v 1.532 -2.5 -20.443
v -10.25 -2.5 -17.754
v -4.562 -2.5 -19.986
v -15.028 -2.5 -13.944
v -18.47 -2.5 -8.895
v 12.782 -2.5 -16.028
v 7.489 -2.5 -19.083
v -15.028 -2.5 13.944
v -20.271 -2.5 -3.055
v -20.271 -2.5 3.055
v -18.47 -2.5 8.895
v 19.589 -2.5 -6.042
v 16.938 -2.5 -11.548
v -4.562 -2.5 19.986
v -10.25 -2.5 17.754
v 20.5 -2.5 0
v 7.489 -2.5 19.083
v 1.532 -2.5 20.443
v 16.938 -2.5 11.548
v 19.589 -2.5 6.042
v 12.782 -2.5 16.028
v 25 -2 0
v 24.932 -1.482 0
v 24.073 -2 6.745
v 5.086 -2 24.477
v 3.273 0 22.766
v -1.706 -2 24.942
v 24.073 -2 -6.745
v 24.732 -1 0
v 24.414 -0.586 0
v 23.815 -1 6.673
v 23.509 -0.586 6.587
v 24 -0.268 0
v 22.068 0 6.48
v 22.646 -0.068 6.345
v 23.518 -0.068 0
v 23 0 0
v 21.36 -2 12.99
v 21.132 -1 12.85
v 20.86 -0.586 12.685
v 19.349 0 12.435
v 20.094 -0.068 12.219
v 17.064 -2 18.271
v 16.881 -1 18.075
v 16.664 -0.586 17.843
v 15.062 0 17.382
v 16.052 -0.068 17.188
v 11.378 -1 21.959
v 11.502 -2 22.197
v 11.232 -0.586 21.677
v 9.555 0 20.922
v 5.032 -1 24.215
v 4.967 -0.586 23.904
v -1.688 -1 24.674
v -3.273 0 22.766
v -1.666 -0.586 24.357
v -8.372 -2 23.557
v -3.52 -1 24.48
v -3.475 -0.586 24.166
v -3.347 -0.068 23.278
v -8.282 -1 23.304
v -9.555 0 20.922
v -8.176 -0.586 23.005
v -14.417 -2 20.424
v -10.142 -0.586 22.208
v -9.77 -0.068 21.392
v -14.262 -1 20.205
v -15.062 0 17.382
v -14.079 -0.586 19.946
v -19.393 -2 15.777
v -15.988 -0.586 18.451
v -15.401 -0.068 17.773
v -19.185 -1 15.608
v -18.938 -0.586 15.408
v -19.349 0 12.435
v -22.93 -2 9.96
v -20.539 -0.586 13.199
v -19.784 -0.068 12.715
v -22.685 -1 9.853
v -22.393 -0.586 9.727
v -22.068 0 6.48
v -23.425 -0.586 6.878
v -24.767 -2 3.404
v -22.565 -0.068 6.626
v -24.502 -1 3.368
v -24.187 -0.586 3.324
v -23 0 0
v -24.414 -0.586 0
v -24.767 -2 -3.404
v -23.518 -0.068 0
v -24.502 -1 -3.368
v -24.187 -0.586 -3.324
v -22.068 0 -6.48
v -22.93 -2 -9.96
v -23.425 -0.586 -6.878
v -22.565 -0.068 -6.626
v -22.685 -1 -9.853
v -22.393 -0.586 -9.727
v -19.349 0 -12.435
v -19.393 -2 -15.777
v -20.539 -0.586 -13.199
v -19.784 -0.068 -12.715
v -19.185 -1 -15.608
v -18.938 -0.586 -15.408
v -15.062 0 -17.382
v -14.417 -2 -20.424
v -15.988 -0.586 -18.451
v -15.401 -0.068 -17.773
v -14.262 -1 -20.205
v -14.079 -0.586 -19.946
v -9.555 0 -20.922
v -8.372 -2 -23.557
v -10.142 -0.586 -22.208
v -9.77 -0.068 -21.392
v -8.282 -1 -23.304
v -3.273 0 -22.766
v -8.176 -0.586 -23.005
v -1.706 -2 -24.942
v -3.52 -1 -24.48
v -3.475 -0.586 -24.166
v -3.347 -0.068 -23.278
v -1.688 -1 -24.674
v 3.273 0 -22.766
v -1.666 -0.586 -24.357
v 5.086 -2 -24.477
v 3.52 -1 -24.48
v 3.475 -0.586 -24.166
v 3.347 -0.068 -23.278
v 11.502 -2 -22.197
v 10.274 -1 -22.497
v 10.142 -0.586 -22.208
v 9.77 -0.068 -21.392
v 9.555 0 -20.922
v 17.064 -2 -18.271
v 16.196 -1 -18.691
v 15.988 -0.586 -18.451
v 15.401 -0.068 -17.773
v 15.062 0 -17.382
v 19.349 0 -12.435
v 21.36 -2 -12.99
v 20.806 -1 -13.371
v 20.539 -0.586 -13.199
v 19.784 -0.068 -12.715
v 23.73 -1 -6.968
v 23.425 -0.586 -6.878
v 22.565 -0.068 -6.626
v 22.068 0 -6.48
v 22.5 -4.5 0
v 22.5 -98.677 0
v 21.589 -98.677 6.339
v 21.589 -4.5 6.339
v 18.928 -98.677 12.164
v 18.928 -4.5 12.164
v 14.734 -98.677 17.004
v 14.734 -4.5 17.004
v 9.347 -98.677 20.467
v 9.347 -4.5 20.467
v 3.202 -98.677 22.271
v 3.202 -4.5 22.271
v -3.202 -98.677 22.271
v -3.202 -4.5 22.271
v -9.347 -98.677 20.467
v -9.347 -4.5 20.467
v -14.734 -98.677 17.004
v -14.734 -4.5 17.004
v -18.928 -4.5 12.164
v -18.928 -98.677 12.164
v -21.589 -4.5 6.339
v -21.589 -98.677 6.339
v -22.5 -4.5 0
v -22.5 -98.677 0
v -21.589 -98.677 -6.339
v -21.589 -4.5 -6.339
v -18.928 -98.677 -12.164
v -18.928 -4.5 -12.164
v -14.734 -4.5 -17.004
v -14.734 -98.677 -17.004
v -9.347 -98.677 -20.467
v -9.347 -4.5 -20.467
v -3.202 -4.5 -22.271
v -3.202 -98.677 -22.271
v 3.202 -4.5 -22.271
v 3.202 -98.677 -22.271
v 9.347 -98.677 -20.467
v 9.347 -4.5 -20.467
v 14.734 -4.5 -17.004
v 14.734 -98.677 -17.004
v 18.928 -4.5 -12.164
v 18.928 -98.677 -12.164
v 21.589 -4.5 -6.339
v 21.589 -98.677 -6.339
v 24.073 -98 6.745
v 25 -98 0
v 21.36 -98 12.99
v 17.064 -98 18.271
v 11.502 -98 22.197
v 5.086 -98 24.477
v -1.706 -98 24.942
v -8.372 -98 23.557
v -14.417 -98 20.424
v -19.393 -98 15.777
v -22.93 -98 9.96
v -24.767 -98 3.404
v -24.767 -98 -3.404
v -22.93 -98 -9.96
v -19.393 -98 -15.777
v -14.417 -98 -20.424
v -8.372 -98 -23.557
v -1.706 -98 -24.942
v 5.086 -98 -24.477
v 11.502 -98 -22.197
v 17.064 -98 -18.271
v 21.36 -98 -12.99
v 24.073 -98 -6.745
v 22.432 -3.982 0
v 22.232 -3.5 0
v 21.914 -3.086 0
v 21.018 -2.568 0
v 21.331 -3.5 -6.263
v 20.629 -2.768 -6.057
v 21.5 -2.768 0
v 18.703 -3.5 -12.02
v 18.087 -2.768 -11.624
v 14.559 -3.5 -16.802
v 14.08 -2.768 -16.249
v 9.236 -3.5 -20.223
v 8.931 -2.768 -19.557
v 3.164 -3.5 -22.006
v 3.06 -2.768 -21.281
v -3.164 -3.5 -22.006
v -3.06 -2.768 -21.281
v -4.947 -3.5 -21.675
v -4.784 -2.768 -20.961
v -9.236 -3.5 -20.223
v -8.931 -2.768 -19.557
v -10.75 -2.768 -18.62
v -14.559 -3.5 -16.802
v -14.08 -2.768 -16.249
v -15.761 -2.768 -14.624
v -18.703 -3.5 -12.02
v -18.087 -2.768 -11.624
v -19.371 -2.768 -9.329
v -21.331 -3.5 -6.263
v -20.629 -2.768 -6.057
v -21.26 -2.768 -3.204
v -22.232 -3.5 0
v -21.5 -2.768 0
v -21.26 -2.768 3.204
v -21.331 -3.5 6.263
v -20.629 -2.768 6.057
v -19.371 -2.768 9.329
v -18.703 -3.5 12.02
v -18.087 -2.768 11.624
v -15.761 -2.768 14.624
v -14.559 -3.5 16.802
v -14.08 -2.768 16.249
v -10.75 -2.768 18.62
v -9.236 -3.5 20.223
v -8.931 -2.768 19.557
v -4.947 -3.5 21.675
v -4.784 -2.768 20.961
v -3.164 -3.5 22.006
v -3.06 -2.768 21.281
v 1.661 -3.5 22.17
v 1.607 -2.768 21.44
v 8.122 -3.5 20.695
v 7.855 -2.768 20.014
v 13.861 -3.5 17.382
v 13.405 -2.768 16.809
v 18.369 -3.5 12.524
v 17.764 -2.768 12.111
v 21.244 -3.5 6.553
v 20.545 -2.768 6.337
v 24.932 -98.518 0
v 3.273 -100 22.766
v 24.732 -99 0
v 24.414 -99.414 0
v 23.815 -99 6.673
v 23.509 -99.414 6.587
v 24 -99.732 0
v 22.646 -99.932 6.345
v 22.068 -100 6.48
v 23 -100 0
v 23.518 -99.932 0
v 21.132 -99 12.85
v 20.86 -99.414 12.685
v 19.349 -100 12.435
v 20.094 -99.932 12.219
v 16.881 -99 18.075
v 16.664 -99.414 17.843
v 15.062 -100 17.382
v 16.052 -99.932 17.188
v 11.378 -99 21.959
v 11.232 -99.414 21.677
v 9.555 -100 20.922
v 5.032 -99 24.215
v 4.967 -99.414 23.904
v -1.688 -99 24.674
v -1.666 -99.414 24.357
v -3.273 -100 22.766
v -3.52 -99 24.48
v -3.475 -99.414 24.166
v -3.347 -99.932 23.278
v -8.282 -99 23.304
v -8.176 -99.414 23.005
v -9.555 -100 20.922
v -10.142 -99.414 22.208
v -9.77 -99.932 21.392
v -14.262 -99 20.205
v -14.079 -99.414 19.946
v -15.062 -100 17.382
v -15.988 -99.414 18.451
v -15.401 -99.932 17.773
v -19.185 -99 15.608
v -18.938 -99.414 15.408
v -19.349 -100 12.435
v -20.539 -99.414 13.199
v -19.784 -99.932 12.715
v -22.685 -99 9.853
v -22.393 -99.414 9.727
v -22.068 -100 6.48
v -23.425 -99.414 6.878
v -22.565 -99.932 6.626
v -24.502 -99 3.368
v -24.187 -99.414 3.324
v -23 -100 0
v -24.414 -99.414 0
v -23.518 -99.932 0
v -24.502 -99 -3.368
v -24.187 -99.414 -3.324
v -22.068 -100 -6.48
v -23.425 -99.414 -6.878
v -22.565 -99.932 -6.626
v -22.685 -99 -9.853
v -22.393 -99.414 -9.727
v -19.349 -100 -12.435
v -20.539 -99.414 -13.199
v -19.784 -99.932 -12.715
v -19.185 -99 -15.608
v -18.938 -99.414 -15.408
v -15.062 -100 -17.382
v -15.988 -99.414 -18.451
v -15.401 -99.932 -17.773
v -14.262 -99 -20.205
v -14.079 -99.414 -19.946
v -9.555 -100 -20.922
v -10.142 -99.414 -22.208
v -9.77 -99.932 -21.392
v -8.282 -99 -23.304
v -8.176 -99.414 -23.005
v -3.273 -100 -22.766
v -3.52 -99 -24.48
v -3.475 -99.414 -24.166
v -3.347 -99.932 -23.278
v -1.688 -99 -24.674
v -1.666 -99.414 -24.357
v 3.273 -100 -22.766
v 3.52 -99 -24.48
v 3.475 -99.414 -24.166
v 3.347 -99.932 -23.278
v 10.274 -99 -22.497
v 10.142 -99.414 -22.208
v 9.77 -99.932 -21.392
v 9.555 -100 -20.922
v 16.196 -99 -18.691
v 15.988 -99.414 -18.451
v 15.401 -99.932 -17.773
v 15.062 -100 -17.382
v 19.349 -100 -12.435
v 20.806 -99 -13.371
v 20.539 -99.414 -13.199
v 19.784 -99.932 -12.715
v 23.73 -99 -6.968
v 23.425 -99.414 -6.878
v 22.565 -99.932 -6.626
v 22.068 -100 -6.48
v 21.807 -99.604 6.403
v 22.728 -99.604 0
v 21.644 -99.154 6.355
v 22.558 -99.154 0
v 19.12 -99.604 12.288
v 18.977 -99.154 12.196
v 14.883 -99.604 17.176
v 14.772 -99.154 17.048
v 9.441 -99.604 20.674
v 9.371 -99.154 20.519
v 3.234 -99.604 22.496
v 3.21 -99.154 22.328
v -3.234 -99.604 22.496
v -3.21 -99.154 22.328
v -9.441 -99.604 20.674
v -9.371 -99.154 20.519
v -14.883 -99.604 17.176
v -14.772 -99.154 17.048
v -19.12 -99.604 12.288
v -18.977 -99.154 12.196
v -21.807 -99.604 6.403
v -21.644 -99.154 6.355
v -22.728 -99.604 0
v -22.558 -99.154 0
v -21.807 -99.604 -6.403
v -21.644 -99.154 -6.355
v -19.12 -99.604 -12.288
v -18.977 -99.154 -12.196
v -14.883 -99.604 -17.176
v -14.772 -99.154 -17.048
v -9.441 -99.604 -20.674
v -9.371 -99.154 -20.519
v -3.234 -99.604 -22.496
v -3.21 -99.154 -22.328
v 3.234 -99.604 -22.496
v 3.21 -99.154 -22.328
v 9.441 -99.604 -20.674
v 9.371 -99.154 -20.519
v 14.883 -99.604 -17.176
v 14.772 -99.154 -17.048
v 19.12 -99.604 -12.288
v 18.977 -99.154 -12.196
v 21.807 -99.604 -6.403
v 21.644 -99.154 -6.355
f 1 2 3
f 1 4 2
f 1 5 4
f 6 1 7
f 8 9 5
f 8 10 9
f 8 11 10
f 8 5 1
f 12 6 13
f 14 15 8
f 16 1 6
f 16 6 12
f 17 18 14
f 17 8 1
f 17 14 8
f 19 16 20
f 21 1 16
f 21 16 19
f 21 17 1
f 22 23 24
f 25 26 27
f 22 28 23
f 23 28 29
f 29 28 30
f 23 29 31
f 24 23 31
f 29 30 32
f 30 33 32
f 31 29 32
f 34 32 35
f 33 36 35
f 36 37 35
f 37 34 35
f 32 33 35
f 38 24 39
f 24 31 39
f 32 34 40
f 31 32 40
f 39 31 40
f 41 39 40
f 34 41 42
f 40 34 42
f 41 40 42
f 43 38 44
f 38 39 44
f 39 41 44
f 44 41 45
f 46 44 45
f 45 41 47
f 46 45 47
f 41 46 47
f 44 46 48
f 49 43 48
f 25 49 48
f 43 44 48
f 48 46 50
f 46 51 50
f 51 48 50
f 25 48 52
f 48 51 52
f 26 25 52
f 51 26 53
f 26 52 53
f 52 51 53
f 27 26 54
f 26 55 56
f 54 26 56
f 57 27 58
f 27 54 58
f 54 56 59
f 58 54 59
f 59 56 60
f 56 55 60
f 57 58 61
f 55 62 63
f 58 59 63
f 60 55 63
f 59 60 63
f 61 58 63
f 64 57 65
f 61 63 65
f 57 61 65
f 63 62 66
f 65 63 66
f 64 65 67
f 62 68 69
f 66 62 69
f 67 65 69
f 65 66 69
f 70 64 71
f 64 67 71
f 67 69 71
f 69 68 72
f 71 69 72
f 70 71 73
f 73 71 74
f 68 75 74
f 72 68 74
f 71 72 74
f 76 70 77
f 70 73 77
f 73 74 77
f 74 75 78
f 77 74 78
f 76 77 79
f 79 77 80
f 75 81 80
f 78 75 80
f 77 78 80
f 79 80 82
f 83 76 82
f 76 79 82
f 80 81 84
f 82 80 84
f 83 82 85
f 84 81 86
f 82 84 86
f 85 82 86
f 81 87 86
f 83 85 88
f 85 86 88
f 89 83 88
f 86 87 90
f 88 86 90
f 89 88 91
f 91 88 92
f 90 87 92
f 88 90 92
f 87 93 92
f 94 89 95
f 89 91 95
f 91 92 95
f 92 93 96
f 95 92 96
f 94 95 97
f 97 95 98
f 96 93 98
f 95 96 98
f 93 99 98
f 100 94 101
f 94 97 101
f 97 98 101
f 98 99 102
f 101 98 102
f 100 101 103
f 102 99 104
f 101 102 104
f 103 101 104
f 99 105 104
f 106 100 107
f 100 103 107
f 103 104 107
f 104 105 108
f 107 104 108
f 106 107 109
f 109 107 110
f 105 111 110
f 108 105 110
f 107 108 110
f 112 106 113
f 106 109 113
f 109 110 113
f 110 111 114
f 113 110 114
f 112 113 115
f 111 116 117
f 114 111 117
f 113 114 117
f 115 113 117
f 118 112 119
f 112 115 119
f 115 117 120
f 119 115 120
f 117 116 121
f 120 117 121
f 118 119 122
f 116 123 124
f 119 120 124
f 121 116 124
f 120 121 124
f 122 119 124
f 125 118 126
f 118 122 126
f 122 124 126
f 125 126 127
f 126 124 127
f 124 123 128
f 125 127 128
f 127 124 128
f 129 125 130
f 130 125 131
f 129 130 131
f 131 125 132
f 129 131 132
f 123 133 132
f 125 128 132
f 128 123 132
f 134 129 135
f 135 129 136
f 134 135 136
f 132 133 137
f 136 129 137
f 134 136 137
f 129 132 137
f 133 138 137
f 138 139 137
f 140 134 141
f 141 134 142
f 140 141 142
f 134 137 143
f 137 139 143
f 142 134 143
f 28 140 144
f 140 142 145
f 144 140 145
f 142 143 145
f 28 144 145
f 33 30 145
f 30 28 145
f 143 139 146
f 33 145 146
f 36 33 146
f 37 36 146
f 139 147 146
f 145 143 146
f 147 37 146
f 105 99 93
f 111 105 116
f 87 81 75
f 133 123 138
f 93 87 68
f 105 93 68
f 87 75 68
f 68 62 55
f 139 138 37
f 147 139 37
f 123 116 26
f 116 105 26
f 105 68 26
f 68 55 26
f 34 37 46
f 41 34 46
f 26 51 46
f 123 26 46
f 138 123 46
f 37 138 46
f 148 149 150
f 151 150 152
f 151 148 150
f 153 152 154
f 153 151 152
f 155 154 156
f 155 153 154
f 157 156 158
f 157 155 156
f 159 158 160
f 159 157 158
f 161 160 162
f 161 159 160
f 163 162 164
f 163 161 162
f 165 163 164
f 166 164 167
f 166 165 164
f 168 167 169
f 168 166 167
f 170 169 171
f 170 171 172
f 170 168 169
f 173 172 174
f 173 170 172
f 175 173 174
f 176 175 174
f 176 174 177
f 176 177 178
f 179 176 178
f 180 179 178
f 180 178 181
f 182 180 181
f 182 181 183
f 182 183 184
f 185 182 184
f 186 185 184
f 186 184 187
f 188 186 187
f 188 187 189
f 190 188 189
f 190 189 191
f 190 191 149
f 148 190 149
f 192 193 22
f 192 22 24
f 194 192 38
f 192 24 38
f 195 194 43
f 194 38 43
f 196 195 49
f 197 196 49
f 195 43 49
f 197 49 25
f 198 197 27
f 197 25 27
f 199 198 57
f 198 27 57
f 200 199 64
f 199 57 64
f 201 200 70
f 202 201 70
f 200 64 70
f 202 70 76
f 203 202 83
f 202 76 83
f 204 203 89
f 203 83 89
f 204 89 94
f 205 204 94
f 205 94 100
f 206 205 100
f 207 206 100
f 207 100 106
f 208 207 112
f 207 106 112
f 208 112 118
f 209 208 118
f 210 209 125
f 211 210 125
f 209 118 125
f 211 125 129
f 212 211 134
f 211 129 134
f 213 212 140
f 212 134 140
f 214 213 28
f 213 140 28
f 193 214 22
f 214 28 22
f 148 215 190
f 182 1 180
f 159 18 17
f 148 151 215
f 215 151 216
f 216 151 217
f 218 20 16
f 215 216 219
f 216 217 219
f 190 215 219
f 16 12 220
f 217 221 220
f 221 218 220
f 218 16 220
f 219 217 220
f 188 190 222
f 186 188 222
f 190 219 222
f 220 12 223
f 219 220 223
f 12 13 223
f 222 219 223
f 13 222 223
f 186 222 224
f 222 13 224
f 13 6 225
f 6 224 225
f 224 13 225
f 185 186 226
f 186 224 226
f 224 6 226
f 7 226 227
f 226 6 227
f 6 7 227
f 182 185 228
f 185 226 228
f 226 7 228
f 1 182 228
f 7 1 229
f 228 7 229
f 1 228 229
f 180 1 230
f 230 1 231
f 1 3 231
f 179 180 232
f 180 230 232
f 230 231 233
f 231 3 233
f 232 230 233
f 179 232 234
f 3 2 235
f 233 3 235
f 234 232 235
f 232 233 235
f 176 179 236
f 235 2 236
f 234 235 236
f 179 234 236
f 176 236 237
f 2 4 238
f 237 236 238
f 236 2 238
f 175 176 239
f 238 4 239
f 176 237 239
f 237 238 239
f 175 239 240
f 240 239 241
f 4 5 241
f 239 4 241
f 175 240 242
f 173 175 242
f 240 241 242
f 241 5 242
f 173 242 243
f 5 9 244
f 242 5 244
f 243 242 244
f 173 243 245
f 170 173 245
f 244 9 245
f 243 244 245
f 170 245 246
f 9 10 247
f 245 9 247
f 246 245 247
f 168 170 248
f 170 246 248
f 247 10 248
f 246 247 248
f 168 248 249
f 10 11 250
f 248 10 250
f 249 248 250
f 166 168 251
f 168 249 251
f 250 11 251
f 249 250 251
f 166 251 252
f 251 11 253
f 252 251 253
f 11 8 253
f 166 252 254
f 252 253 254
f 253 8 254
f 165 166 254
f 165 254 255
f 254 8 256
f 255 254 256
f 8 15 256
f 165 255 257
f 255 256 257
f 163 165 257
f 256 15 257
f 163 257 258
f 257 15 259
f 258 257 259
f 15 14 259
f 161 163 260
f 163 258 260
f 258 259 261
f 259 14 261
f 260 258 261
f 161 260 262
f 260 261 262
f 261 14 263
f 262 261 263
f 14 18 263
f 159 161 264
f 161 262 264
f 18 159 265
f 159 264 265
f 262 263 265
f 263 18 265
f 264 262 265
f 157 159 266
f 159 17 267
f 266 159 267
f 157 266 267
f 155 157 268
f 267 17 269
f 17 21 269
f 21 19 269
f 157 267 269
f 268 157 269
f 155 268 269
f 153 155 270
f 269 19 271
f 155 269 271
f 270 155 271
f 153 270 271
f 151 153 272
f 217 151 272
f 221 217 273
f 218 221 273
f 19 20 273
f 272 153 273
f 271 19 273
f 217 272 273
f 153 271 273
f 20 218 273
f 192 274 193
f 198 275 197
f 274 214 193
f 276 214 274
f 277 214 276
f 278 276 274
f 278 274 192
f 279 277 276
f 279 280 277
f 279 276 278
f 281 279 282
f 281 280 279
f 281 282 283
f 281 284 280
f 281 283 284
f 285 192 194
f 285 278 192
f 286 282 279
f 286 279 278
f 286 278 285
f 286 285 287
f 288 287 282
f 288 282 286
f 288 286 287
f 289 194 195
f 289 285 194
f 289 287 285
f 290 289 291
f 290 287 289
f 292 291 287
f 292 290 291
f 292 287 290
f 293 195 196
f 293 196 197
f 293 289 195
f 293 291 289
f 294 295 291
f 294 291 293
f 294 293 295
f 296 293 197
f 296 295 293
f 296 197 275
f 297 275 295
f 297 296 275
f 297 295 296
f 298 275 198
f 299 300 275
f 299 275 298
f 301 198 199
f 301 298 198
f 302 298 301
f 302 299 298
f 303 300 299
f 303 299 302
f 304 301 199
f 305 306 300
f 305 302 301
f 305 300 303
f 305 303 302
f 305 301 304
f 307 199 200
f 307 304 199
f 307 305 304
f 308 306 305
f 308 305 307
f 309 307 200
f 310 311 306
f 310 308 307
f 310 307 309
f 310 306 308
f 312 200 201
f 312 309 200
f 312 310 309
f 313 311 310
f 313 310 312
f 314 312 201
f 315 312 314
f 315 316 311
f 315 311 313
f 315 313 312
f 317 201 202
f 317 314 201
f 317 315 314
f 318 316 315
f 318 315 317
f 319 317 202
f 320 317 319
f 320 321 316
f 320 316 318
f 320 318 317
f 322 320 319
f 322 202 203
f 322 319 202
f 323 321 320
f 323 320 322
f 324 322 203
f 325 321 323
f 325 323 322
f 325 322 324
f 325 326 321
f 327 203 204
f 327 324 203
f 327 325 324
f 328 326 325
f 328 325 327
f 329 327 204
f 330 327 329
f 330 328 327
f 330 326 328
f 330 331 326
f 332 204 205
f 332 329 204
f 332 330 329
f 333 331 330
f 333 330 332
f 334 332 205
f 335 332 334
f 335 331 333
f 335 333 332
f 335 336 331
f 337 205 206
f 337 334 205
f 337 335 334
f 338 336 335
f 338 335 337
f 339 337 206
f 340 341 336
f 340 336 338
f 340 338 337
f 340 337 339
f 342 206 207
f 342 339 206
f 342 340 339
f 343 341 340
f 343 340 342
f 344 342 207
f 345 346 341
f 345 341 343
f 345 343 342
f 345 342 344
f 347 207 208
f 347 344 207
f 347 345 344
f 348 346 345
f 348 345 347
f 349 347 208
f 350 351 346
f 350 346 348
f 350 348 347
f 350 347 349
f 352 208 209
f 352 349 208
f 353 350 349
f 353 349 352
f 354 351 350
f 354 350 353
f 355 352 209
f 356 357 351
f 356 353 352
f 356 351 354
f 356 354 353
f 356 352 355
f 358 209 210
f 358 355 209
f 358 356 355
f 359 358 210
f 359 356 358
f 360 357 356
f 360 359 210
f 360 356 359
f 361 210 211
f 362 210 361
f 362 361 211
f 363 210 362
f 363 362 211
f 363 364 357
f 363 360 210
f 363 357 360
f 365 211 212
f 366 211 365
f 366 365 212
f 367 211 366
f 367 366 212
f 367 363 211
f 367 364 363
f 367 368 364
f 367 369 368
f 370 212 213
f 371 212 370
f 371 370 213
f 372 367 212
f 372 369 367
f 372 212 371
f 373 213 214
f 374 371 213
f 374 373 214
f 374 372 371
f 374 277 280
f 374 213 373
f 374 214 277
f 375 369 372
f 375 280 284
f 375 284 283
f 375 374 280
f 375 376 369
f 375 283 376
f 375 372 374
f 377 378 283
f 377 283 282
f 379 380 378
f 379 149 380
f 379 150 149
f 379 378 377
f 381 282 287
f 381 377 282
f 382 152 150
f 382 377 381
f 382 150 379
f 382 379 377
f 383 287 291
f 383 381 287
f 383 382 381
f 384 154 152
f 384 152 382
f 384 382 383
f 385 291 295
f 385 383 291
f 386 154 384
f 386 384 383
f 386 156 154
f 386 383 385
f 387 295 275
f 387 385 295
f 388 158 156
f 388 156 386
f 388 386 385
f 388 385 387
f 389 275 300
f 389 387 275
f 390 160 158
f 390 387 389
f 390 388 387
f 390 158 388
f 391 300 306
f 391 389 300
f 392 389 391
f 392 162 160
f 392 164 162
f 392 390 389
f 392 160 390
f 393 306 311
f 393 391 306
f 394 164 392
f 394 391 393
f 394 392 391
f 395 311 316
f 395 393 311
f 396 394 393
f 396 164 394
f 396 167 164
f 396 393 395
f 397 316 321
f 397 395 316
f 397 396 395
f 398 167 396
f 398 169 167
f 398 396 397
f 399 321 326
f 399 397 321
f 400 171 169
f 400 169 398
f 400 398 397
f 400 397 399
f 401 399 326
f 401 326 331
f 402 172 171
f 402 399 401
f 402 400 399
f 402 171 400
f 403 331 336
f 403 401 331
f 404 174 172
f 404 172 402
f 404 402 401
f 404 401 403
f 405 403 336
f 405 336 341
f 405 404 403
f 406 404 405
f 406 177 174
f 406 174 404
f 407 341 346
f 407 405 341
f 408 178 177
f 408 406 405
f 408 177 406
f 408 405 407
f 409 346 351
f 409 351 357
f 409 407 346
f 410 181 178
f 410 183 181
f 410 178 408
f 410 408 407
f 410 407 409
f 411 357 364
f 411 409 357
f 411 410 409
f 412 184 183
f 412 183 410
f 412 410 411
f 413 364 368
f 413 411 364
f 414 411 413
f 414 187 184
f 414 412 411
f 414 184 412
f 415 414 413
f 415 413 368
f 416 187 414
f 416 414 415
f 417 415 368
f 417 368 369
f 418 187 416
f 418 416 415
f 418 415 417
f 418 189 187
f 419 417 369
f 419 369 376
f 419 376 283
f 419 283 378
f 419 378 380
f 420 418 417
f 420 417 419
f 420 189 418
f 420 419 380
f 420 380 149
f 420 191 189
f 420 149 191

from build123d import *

# Parameters (mm, degrees)
F0_R     = 25
F1_DEPTH = 100
F2_T     = -2.5
F3_R     = 2


# Not quite as in the source:
# - a fillet or chamfer that OpenCascade refuses, or shapes differently, is made with other operations: its cross-section is extruded or revolved along the edge and cut away or added


with BuildPart() as f1:
    # F0 (on Front) → F1 (new body)
    with BuildSketch(Plane.XZ):
        Circle(F0_R)
    extrude(amount=F1_DEPTH)

    # F2
    f2_openings = [f1.faces().sort_by_distance(p)[0] for p in [
        (0, -100, 0),
    ]]
    offset(amount=F2_T, openings=f2_openings)

    # F3
    f3_edges = [f1.edges().sort_by_distance(p)[0] for p in [
        (25, -50, 0),
        (-25, 0, 0),
        (-25, -100, 0),
    ]]
    fillet(f3_edges, radius=F3_R)

    # F4: fillet of radius 2 on 3 edges, made by hand

    # F4_s1 → F4_t2 (revolve)
    with BuildSketch(Plane.XY):
        with BuildLine():
            ThreePointArc((22.5, -4.5), (21.9142135624, -3.0857864376), (20.5, -2.5))
            Line((20.5, -2.5), (22.5, -2.5))
            Line((22.5, -2.5), (22.5, -4.5))
        make_face()
    revolve(axis=Axis((0, -2.5, 0), (0, 1, 0)))

    # F4_s3 → F4_t4 (revolve, cut)
    with BuildSketch(Plane.XY):
        with BuildLine():
            ThreePointArc((23, -100), (22.6291713066, -99.3842311257), (22.5, -98.6771243445))
            Line((22.5, -98.6771243445), (22.5, -100))
            Line((22.5, -100), (23, -100))
        make_face()
    revolve(axis=Axis((0, -100, 0), (0, -1, 0)), mode=Mode.SUBTRACT)


solid = f1.part
